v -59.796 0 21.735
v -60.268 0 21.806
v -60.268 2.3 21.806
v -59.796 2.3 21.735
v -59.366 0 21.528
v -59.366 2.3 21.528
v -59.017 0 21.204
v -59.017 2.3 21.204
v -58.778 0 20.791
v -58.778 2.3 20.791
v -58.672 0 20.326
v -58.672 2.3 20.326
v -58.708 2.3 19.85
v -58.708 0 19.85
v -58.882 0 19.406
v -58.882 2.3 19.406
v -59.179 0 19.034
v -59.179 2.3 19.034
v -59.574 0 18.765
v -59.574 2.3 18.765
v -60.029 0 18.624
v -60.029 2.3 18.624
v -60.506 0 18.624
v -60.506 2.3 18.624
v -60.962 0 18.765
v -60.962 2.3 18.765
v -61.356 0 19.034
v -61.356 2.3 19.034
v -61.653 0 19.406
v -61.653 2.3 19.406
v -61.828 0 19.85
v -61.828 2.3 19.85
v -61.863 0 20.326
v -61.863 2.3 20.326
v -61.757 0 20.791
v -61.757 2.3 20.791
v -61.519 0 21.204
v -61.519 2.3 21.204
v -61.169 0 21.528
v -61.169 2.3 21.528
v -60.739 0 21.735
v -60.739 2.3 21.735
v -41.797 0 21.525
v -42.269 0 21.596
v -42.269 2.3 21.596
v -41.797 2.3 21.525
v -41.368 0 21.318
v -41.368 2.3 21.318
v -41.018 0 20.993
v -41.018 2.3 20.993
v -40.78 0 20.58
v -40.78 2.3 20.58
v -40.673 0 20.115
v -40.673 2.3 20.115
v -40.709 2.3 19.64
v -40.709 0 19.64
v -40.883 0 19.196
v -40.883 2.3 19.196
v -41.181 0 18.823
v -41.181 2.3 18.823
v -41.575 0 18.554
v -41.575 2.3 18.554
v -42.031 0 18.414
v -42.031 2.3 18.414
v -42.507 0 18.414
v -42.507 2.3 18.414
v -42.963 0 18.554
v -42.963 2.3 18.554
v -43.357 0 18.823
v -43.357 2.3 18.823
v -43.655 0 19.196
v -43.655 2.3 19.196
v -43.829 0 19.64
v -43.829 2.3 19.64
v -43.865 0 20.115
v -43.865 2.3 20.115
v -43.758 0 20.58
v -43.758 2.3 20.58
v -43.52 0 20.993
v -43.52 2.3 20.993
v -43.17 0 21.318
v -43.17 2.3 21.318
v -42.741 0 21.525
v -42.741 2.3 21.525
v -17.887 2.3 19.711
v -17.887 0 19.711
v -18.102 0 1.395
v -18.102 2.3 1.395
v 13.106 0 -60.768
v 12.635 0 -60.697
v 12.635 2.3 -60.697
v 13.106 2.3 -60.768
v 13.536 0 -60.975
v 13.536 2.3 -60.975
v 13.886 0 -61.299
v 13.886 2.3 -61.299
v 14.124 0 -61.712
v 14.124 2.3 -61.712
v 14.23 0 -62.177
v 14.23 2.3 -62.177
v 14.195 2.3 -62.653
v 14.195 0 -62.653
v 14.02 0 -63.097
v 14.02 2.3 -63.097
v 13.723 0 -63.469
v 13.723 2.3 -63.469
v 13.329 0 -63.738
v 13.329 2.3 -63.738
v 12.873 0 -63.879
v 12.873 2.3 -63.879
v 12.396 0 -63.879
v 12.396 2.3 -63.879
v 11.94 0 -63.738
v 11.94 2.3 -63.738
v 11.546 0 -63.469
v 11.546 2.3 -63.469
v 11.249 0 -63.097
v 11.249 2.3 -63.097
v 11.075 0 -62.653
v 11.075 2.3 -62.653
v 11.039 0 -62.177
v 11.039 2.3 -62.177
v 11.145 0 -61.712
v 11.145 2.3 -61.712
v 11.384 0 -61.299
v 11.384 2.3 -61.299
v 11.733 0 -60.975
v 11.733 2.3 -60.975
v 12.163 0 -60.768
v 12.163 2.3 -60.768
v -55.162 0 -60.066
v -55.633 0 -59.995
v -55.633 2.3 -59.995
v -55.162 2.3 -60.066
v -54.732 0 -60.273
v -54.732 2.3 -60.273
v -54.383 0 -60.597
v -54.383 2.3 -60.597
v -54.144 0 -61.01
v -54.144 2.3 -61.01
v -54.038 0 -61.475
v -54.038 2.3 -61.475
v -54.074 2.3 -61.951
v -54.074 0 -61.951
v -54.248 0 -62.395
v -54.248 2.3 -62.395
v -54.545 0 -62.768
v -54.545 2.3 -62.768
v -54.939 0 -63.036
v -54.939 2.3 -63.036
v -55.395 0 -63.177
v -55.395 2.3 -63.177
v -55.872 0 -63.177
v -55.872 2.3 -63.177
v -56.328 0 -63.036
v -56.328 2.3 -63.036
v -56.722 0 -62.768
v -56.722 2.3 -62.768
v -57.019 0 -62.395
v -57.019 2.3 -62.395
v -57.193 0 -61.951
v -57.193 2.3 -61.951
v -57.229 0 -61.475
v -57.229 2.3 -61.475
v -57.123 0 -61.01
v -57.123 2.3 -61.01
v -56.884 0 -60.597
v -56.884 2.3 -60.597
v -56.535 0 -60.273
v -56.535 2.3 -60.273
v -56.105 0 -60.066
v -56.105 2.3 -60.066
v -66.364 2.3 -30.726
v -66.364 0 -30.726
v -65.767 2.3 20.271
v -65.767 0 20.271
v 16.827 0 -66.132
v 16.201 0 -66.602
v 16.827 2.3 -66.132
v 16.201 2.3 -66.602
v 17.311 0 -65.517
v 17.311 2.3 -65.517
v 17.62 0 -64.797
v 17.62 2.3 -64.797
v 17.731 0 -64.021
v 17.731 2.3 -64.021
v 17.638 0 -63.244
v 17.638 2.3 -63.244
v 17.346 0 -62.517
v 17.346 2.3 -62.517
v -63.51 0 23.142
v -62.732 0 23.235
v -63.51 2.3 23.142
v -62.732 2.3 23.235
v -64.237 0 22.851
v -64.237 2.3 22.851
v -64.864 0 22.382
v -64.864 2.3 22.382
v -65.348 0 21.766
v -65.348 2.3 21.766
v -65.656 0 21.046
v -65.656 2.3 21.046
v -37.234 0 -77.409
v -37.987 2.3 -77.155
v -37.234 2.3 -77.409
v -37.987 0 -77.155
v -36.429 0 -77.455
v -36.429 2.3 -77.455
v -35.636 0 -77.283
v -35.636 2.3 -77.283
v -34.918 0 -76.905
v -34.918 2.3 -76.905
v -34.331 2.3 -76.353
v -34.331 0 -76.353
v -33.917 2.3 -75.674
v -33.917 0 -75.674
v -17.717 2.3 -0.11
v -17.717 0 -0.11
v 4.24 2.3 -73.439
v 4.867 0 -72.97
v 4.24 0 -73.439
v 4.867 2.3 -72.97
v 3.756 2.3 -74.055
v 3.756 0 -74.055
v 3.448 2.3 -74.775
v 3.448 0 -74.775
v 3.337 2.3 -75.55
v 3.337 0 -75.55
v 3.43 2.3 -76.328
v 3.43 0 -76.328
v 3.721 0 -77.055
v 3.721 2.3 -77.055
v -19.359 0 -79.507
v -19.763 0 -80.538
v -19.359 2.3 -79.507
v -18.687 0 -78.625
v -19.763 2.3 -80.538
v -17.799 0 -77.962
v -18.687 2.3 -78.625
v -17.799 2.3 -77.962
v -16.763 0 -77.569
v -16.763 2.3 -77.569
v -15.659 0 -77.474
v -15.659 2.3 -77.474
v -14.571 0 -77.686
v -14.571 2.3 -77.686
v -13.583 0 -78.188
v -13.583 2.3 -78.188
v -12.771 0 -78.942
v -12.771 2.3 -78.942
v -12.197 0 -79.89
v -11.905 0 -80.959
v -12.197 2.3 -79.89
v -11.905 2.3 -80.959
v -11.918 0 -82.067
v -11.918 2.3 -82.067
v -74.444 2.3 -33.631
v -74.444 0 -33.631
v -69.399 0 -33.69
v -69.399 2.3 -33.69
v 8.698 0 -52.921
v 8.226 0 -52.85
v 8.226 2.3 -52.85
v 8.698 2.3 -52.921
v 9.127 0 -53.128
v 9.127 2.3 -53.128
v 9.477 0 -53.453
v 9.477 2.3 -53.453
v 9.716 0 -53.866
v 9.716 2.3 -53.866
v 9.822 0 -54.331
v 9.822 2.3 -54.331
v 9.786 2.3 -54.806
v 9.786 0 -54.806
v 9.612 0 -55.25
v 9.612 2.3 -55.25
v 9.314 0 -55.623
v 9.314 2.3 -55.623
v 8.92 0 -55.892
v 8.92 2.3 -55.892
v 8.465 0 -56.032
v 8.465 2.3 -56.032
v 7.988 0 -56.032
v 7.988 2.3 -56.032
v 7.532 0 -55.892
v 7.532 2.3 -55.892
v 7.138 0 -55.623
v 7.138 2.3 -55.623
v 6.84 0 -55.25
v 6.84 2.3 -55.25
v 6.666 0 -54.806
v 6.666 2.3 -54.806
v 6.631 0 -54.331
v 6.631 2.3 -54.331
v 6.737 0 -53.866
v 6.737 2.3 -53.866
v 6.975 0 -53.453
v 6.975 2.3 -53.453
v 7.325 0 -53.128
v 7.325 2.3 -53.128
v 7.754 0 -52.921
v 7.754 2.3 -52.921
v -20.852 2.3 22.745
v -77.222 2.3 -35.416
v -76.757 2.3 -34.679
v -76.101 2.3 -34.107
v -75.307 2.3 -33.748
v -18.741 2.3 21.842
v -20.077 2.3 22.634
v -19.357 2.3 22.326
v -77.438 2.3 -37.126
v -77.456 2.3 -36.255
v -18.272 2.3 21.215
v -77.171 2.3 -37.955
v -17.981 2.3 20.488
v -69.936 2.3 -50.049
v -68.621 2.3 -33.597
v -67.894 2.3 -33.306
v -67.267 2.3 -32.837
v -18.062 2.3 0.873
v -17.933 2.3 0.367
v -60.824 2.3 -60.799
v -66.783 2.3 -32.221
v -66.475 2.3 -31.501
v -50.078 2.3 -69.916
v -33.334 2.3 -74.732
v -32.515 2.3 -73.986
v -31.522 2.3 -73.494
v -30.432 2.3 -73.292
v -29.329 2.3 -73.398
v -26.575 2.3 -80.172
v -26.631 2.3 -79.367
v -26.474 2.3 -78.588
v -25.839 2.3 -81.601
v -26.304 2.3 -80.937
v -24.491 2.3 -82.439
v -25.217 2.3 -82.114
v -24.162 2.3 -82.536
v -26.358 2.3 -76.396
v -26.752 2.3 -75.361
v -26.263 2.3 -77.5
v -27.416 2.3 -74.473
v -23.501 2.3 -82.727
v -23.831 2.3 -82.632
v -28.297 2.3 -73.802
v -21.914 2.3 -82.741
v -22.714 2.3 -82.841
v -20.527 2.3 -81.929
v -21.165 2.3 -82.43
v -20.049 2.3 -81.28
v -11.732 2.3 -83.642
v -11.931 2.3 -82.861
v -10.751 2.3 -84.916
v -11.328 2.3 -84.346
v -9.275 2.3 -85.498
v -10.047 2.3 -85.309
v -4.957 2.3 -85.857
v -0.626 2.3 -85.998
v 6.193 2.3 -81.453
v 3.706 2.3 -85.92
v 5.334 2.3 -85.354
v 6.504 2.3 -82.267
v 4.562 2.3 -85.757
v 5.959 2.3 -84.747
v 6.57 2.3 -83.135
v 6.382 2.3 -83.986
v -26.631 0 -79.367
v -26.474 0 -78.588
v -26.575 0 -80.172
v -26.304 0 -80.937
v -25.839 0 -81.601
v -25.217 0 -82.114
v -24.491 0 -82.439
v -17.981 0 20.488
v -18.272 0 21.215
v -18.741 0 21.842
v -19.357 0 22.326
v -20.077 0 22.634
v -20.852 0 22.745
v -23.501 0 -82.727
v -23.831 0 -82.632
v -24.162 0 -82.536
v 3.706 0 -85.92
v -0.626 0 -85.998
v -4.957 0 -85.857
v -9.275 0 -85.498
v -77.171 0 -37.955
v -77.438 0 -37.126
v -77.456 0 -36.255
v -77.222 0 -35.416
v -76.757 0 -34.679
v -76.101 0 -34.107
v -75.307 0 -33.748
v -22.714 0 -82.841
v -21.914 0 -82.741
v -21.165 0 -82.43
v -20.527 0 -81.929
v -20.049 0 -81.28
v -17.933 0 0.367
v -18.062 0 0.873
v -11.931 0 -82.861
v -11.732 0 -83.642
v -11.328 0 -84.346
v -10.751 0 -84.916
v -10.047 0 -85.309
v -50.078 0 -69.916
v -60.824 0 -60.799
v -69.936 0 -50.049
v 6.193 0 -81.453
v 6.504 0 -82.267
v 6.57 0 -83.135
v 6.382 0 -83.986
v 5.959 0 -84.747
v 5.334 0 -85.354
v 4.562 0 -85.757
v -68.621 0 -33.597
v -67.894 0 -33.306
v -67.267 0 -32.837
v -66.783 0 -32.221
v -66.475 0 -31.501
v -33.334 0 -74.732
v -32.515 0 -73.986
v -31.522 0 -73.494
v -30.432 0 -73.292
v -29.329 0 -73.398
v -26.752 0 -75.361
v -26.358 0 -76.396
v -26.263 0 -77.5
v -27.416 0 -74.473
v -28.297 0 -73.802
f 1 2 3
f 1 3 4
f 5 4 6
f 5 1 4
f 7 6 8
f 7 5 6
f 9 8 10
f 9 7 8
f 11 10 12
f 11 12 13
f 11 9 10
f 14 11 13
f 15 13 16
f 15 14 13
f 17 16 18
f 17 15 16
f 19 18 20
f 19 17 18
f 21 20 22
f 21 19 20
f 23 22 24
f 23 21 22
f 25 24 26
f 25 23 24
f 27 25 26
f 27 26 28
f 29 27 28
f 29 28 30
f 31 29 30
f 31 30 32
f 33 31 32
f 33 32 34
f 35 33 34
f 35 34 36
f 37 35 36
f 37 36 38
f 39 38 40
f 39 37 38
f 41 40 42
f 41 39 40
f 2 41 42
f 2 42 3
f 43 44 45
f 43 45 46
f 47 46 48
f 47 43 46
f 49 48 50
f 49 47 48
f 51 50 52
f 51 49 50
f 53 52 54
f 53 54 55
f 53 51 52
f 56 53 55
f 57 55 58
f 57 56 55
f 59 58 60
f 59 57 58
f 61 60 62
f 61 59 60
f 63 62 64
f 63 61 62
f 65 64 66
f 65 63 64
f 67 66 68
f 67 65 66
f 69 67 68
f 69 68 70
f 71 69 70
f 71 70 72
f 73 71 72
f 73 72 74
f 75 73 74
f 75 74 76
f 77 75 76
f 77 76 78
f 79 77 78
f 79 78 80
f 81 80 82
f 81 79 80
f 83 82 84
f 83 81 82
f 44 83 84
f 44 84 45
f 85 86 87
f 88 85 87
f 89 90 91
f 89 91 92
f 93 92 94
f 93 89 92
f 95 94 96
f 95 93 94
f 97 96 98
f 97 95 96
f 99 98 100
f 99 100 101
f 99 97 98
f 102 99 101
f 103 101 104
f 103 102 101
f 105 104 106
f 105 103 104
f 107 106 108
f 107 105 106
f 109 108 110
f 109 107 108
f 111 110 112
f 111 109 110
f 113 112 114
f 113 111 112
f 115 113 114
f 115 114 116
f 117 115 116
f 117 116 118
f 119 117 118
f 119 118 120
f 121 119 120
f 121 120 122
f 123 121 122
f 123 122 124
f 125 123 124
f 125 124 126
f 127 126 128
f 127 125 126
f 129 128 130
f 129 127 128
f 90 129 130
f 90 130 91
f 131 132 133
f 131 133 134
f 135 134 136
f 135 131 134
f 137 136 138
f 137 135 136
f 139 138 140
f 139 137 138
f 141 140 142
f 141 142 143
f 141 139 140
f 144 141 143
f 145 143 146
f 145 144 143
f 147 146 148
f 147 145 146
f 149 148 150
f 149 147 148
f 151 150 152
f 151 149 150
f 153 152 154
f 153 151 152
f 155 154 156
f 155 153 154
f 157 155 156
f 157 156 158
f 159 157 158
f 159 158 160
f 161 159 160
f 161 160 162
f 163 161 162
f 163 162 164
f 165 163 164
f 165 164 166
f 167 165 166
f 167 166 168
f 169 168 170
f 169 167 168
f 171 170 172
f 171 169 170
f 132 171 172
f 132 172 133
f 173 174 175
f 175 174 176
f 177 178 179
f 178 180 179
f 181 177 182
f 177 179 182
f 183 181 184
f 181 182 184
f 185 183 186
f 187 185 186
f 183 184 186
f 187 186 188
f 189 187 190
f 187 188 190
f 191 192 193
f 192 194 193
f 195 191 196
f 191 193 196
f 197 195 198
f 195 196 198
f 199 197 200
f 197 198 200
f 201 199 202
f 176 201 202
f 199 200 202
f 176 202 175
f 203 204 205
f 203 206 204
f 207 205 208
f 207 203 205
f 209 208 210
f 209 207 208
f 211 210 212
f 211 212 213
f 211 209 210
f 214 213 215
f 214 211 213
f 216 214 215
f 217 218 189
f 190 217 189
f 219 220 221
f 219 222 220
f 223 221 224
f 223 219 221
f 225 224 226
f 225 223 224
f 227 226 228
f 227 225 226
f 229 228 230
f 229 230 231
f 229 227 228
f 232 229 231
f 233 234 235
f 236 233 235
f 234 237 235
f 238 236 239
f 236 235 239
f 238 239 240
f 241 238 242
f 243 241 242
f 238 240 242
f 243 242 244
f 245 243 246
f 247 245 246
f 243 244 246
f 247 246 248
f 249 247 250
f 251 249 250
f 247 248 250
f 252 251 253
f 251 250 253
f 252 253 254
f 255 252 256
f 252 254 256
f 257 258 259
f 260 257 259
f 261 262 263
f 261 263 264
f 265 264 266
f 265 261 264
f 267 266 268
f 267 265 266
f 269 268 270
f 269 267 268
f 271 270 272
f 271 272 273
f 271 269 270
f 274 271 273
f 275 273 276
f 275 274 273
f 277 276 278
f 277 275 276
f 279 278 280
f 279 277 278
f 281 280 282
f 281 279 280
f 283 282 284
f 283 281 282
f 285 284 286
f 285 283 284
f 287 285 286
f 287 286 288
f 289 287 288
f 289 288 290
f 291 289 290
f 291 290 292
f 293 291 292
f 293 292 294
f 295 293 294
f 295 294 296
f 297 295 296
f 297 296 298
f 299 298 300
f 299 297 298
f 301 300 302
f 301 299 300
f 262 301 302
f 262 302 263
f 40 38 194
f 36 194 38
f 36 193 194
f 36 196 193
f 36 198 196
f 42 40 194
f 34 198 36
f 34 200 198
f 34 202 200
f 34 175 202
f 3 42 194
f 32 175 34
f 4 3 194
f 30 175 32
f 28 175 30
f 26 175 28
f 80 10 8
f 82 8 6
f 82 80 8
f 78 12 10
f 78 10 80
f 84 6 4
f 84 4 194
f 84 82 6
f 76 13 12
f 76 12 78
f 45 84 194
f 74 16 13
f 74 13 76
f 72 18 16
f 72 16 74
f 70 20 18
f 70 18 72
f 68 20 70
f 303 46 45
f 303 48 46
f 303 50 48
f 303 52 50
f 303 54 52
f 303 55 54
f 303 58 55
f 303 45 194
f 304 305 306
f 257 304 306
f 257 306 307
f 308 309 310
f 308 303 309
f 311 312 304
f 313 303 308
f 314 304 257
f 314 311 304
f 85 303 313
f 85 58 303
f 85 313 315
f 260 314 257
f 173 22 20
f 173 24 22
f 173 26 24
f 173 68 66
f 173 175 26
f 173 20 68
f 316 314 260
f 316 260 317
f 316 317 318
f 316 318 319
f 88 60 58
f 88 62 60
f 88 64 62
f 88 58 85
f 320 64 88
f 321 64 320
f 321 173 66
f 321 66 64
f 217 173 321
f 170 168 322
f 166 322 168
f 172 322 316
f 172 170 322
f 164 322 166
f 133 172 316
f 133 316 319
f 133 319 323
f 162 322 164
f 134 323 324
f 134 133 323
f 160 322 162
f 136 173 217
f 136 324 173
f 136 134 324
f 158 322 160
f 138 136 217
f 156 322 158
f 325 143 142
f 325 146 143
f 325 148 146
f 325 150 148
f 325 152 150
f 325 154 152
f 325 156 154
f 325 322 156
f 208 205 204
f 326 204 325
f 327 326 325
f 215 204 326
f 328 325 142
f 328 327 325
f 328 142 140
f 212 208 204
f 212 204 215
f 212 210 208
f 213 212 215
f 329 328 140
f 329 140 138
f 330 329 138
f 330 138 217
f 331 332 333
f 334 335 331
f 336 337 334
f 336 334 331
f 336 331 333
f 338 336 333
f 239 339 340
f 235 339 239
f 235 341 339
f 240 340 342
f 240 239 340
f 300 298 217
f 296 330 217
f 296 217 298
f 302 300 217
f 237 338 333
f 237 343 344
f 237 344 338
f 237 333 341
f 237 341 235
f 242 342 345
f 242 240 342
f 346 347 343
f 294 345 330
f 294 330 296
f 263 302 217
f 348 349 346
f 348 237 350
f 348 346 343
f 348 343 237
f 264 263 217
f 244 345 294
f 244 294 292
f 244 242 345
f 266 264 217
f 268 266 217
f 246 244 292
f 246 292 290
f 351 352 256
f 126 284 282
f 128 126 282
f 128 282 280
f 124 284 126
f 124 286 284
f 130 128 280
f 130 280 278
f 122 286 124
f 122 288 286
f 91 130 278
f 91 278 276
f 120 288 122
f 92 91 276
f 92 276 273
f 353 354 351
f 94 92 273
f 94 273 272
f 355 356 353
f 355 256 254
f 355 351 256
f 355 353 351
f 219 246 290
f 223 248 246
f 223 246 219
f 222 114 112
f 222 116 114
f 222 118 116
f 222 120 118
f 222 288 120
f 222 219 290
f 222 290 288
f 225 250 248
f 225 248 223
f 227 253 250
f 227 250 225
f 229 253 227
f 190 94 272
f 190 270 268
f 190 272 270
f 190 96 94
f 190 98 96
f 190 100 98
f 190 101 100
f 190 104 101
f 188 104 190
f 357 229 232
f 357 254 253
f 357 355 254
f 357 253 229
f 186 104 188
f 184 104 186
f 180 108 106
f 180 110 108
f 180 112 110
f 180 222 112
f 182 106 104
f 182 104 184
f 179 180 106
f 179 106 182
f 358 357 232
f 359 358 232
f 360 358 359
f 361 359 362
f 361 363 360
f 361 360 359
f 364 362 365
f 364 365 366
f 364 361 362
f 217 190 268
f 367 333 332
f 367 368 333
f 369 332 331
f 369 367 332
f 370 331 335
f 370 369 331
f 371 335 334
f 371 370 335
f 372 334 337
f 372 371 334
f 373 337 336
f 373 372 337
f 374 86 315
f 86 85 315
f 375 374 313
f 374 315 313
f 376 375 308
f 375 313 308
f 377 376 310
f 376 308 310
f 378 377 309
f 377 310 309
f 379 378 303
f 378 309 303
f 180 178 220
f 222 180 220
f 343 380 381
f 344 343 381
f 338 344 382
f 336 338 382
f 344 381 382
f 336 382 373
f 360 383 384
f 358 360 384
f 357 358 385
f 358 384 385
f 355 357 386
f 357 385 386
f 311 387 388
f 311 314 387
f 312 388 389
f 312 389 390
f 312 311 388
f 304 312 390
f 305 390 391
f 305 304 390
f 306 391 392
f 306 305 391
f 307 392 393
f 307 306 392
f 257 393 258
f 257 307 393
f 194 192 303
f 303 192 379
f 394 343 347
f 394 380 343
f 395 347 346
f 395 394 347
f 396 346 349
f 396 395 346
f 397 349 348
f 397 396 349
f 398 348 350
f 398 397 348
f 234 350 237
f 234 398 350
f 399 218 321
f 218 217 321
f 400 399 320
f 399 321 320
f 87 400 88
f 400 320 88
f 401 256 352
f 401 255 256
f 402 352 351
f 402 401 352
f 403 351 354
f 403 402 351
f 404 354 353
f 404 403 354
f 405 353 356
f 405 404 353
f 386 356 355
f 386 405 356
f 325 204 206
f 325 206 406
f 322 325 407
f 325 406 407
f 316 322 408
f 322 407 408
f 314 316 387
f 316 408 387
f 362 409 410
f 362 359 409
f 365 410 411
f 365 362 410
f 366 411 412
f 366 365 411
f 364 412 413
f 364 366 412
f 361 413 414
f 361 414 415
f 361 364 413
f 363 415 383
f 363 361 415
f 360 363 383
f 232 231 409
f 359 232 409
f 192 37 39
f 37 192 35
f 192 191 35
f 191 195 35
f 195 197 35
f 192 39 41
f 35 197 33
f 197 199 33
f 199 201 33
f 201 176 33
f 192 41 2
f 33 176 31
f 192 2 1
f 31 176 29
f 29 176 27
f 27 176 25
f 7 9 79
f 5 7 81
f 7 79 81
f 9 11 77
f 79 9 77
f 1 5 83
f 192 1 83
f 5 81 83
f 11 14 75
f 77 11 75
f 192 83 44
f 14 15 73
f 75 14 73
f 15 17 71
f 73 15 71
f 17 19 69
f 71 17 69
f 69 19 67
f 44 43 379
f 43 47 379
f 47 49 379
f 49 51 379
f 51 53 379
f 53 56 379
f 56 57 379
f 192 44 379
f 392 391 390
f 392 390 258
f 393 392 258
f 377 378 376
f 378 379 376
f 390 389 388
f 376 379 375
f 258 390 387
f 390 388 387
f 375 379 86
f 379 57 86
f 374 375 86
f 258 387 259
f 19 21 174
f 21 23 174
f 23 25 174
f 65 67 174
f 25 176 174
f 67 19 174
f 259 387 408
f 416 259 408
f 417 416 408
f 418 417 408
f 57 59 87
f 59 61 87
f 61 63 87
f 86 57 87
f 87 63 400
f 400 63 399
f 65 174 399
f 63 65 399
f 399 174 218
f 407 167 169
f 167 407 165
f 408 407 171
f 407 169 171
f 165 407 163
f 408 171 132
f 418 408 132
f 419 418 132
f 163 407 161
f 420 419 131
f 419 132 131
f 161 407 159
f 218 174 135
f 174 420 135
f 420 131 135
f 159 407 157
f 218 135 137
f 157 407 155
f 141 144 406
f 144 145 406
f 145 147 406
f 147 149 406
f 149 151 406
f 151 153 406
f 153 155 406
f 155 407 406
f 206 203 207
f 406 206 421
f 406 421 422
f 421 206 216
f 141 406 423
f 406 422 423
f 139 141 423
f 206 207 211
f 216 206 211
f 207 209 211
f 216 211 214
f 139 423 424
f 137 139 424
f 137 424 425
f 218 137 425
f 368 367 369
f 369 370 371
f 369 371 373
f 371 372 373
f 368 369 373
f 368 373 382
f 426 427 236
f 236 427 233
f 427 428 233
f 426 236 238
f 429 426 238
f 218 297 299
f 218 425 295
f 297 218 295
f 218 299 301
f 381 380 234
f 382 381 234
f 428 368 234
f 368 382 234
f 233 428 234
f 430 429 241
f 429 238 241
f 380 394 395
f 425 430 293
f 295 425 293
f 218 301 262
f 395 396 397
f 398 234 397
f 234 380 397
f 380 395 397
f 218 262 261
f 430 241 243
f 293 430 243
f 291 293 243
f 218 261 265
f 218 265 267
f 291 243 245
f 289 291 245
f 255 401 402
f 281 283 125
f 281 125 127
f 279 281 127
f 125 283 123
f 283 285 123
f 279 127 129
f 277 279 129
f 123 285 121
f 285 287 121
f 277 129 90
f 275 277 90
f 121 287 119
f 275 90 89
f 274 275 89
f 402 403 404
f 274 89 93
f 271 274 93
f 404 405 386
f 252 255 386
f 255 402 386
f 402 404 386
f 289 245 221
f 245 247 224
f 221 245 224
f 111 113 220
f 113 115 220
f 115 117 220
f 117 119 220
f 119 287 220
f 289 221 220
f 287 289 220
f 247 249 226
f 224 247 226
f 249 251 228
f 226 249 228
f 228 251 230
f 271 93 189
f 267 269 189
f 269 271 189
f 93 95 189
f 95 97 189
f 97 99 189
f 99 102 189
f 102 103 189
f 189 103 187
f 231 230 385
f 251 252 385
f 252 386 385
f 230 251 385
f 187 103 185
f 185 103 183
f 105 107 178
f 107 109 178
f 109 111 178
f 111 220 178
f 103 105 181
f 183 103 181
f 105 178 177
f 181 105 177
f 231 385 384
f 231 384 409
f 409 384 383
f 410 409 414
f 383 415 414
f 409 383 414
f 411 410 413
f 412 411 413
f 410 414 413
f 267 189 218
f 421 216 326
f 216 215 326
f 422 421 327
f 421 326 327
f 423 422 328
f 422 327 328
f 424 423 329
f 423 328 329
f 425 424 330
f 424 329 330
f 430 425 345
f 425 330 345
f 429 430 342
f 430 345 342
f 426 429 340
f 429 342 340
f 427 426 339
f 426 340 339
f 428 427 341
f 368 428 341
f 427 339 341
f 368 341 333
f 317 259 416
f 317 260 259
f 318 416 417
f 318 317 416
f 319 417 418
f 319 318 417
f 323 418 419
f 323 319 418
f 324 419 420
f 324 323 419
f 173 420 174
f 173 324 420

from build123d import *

# Parameters (mm, degrees)
SKETCH1_R           = 1.6
BOSS_EXTRUDE1_DEPTH = 2.3
FILLET1_R           = 3
SKETCH3_R           = 4
CUT_EXTRUDE1_DEPTH  = 44.3
FILLET2_R           = 3


with BuildPart() as part:
    # Sketch1 → Boss-Extrude1 (new body)
    with BuildSketch(Plane(origin=(0, 0, 0), x_dir=(1, 0, 0), z_dir=(0, 1, 0))):
        with BuildLine():
            Line((18.815976516, 65.132242613), (2.251488694, 74.439107992))
            Line((2.251488694, 74.439107992), (8.509906392, 85.577926437))
            ThreePointArc((8.509906392, 85.577926437), (-43.86830382, 73.970074489), (-79.174773721, 33.576110647))
            Line((-79.174773721, 33.576110647), (-66.399065131, 33.725571155))
            Line((-66.399065131, 33.725571155), (-65.732278943, -23.270528678))
            Line((-65.732278943, -23.270528678), (-17.85230327, -22.710390238))
            Line((-17.85230327, -22.710390238), (-18.111073304, -0.591031778))
            Line((-18.111073304, -0.591031778), (18.815976516, 65.132242613))
        make_face()
        with Locations(Location((12.634623312, 62.296599376, 0), (0, 0, 270))):
            Circle(SKETCH1_R, mode=Mode.SUBTRACT)
        with Locations(Location((8.226108132, 54.450263039, 0), (0, 0, 270))):
            Circle(SKETCH1_R, mode=Mode.SUBTRACT)
        with Locations(Location((-42.268980916, -19.995830873, 0), (0, 0, 270))):
            Circle(SKETCH1_R, mode=Mode.SUBTRACT)
        with Locations(Location((-60.267749285, -20.206394932, 0), (0, 0, 270))):
            Circle(SKETCH1_R, mode=Mode.SUBTRACT)
        with Locations(Location((-55.633474662, 61.59477654, 0), (0, 0, 270))):
            Circle(SKETCH1_R, mode=Mode.SUBTRACT)
    extrude(amount=BOSS_EXTRUDE1_DEPTH)

    # Fillet1
    fillet1_edges = [part.edges().sort_by_distance(p)[0] for p in [
        (8.509906392, 1.15, -85.577926437),
        (2.251488694, 1.15, -74.439107992),
        (18.815976516, 1.15, -65.132242613),
        (-18.111073304, 1.15, 0.591031778),
        (-17.85230327, 1.15, 22.710390238),
        (-65.732278943, 1.15, 23.270528678),
        (-66.399065131, 1.15, -33.725571155),
        (-79.174773721, 1.15, -33.576110647),
    ]]
    fillet(fillet1_edges, radius=FILLET1_R)

    # Sketch3 → Cut-Extrude1 (cut)
    with BuildSketch(Plane(origin=(0, 2.3, 0), x_dir=(1, 0, 0), z_dir=(0, 1, 0))):
        with Locations((-30.257228913, 77.288421504)):
            Circle(SKETCH3_R)
        with Locations((-15.872582201, 81.468160248)):
            Circle(SKETCH3_R)
    extrude(amount=-CUT_EXTRUDE1_DEPTH, mode=Mode.SUBTRACT)

    # Fillet2
    fillet2_edges = [part.edges().sort_by_distance(p)[0] for p in [
        (-28.827983469, 1.15, -81.024362812),
        (-33.842999164, 1.15, -79.06106126),
        (-13.795112573, 1.15, -84.886364447),
        (-19.081339078, 1.15, -83.856439818),
    ]]
    fillet(fillet2_edges, radius=FILLET2_R)


solid = part.part
